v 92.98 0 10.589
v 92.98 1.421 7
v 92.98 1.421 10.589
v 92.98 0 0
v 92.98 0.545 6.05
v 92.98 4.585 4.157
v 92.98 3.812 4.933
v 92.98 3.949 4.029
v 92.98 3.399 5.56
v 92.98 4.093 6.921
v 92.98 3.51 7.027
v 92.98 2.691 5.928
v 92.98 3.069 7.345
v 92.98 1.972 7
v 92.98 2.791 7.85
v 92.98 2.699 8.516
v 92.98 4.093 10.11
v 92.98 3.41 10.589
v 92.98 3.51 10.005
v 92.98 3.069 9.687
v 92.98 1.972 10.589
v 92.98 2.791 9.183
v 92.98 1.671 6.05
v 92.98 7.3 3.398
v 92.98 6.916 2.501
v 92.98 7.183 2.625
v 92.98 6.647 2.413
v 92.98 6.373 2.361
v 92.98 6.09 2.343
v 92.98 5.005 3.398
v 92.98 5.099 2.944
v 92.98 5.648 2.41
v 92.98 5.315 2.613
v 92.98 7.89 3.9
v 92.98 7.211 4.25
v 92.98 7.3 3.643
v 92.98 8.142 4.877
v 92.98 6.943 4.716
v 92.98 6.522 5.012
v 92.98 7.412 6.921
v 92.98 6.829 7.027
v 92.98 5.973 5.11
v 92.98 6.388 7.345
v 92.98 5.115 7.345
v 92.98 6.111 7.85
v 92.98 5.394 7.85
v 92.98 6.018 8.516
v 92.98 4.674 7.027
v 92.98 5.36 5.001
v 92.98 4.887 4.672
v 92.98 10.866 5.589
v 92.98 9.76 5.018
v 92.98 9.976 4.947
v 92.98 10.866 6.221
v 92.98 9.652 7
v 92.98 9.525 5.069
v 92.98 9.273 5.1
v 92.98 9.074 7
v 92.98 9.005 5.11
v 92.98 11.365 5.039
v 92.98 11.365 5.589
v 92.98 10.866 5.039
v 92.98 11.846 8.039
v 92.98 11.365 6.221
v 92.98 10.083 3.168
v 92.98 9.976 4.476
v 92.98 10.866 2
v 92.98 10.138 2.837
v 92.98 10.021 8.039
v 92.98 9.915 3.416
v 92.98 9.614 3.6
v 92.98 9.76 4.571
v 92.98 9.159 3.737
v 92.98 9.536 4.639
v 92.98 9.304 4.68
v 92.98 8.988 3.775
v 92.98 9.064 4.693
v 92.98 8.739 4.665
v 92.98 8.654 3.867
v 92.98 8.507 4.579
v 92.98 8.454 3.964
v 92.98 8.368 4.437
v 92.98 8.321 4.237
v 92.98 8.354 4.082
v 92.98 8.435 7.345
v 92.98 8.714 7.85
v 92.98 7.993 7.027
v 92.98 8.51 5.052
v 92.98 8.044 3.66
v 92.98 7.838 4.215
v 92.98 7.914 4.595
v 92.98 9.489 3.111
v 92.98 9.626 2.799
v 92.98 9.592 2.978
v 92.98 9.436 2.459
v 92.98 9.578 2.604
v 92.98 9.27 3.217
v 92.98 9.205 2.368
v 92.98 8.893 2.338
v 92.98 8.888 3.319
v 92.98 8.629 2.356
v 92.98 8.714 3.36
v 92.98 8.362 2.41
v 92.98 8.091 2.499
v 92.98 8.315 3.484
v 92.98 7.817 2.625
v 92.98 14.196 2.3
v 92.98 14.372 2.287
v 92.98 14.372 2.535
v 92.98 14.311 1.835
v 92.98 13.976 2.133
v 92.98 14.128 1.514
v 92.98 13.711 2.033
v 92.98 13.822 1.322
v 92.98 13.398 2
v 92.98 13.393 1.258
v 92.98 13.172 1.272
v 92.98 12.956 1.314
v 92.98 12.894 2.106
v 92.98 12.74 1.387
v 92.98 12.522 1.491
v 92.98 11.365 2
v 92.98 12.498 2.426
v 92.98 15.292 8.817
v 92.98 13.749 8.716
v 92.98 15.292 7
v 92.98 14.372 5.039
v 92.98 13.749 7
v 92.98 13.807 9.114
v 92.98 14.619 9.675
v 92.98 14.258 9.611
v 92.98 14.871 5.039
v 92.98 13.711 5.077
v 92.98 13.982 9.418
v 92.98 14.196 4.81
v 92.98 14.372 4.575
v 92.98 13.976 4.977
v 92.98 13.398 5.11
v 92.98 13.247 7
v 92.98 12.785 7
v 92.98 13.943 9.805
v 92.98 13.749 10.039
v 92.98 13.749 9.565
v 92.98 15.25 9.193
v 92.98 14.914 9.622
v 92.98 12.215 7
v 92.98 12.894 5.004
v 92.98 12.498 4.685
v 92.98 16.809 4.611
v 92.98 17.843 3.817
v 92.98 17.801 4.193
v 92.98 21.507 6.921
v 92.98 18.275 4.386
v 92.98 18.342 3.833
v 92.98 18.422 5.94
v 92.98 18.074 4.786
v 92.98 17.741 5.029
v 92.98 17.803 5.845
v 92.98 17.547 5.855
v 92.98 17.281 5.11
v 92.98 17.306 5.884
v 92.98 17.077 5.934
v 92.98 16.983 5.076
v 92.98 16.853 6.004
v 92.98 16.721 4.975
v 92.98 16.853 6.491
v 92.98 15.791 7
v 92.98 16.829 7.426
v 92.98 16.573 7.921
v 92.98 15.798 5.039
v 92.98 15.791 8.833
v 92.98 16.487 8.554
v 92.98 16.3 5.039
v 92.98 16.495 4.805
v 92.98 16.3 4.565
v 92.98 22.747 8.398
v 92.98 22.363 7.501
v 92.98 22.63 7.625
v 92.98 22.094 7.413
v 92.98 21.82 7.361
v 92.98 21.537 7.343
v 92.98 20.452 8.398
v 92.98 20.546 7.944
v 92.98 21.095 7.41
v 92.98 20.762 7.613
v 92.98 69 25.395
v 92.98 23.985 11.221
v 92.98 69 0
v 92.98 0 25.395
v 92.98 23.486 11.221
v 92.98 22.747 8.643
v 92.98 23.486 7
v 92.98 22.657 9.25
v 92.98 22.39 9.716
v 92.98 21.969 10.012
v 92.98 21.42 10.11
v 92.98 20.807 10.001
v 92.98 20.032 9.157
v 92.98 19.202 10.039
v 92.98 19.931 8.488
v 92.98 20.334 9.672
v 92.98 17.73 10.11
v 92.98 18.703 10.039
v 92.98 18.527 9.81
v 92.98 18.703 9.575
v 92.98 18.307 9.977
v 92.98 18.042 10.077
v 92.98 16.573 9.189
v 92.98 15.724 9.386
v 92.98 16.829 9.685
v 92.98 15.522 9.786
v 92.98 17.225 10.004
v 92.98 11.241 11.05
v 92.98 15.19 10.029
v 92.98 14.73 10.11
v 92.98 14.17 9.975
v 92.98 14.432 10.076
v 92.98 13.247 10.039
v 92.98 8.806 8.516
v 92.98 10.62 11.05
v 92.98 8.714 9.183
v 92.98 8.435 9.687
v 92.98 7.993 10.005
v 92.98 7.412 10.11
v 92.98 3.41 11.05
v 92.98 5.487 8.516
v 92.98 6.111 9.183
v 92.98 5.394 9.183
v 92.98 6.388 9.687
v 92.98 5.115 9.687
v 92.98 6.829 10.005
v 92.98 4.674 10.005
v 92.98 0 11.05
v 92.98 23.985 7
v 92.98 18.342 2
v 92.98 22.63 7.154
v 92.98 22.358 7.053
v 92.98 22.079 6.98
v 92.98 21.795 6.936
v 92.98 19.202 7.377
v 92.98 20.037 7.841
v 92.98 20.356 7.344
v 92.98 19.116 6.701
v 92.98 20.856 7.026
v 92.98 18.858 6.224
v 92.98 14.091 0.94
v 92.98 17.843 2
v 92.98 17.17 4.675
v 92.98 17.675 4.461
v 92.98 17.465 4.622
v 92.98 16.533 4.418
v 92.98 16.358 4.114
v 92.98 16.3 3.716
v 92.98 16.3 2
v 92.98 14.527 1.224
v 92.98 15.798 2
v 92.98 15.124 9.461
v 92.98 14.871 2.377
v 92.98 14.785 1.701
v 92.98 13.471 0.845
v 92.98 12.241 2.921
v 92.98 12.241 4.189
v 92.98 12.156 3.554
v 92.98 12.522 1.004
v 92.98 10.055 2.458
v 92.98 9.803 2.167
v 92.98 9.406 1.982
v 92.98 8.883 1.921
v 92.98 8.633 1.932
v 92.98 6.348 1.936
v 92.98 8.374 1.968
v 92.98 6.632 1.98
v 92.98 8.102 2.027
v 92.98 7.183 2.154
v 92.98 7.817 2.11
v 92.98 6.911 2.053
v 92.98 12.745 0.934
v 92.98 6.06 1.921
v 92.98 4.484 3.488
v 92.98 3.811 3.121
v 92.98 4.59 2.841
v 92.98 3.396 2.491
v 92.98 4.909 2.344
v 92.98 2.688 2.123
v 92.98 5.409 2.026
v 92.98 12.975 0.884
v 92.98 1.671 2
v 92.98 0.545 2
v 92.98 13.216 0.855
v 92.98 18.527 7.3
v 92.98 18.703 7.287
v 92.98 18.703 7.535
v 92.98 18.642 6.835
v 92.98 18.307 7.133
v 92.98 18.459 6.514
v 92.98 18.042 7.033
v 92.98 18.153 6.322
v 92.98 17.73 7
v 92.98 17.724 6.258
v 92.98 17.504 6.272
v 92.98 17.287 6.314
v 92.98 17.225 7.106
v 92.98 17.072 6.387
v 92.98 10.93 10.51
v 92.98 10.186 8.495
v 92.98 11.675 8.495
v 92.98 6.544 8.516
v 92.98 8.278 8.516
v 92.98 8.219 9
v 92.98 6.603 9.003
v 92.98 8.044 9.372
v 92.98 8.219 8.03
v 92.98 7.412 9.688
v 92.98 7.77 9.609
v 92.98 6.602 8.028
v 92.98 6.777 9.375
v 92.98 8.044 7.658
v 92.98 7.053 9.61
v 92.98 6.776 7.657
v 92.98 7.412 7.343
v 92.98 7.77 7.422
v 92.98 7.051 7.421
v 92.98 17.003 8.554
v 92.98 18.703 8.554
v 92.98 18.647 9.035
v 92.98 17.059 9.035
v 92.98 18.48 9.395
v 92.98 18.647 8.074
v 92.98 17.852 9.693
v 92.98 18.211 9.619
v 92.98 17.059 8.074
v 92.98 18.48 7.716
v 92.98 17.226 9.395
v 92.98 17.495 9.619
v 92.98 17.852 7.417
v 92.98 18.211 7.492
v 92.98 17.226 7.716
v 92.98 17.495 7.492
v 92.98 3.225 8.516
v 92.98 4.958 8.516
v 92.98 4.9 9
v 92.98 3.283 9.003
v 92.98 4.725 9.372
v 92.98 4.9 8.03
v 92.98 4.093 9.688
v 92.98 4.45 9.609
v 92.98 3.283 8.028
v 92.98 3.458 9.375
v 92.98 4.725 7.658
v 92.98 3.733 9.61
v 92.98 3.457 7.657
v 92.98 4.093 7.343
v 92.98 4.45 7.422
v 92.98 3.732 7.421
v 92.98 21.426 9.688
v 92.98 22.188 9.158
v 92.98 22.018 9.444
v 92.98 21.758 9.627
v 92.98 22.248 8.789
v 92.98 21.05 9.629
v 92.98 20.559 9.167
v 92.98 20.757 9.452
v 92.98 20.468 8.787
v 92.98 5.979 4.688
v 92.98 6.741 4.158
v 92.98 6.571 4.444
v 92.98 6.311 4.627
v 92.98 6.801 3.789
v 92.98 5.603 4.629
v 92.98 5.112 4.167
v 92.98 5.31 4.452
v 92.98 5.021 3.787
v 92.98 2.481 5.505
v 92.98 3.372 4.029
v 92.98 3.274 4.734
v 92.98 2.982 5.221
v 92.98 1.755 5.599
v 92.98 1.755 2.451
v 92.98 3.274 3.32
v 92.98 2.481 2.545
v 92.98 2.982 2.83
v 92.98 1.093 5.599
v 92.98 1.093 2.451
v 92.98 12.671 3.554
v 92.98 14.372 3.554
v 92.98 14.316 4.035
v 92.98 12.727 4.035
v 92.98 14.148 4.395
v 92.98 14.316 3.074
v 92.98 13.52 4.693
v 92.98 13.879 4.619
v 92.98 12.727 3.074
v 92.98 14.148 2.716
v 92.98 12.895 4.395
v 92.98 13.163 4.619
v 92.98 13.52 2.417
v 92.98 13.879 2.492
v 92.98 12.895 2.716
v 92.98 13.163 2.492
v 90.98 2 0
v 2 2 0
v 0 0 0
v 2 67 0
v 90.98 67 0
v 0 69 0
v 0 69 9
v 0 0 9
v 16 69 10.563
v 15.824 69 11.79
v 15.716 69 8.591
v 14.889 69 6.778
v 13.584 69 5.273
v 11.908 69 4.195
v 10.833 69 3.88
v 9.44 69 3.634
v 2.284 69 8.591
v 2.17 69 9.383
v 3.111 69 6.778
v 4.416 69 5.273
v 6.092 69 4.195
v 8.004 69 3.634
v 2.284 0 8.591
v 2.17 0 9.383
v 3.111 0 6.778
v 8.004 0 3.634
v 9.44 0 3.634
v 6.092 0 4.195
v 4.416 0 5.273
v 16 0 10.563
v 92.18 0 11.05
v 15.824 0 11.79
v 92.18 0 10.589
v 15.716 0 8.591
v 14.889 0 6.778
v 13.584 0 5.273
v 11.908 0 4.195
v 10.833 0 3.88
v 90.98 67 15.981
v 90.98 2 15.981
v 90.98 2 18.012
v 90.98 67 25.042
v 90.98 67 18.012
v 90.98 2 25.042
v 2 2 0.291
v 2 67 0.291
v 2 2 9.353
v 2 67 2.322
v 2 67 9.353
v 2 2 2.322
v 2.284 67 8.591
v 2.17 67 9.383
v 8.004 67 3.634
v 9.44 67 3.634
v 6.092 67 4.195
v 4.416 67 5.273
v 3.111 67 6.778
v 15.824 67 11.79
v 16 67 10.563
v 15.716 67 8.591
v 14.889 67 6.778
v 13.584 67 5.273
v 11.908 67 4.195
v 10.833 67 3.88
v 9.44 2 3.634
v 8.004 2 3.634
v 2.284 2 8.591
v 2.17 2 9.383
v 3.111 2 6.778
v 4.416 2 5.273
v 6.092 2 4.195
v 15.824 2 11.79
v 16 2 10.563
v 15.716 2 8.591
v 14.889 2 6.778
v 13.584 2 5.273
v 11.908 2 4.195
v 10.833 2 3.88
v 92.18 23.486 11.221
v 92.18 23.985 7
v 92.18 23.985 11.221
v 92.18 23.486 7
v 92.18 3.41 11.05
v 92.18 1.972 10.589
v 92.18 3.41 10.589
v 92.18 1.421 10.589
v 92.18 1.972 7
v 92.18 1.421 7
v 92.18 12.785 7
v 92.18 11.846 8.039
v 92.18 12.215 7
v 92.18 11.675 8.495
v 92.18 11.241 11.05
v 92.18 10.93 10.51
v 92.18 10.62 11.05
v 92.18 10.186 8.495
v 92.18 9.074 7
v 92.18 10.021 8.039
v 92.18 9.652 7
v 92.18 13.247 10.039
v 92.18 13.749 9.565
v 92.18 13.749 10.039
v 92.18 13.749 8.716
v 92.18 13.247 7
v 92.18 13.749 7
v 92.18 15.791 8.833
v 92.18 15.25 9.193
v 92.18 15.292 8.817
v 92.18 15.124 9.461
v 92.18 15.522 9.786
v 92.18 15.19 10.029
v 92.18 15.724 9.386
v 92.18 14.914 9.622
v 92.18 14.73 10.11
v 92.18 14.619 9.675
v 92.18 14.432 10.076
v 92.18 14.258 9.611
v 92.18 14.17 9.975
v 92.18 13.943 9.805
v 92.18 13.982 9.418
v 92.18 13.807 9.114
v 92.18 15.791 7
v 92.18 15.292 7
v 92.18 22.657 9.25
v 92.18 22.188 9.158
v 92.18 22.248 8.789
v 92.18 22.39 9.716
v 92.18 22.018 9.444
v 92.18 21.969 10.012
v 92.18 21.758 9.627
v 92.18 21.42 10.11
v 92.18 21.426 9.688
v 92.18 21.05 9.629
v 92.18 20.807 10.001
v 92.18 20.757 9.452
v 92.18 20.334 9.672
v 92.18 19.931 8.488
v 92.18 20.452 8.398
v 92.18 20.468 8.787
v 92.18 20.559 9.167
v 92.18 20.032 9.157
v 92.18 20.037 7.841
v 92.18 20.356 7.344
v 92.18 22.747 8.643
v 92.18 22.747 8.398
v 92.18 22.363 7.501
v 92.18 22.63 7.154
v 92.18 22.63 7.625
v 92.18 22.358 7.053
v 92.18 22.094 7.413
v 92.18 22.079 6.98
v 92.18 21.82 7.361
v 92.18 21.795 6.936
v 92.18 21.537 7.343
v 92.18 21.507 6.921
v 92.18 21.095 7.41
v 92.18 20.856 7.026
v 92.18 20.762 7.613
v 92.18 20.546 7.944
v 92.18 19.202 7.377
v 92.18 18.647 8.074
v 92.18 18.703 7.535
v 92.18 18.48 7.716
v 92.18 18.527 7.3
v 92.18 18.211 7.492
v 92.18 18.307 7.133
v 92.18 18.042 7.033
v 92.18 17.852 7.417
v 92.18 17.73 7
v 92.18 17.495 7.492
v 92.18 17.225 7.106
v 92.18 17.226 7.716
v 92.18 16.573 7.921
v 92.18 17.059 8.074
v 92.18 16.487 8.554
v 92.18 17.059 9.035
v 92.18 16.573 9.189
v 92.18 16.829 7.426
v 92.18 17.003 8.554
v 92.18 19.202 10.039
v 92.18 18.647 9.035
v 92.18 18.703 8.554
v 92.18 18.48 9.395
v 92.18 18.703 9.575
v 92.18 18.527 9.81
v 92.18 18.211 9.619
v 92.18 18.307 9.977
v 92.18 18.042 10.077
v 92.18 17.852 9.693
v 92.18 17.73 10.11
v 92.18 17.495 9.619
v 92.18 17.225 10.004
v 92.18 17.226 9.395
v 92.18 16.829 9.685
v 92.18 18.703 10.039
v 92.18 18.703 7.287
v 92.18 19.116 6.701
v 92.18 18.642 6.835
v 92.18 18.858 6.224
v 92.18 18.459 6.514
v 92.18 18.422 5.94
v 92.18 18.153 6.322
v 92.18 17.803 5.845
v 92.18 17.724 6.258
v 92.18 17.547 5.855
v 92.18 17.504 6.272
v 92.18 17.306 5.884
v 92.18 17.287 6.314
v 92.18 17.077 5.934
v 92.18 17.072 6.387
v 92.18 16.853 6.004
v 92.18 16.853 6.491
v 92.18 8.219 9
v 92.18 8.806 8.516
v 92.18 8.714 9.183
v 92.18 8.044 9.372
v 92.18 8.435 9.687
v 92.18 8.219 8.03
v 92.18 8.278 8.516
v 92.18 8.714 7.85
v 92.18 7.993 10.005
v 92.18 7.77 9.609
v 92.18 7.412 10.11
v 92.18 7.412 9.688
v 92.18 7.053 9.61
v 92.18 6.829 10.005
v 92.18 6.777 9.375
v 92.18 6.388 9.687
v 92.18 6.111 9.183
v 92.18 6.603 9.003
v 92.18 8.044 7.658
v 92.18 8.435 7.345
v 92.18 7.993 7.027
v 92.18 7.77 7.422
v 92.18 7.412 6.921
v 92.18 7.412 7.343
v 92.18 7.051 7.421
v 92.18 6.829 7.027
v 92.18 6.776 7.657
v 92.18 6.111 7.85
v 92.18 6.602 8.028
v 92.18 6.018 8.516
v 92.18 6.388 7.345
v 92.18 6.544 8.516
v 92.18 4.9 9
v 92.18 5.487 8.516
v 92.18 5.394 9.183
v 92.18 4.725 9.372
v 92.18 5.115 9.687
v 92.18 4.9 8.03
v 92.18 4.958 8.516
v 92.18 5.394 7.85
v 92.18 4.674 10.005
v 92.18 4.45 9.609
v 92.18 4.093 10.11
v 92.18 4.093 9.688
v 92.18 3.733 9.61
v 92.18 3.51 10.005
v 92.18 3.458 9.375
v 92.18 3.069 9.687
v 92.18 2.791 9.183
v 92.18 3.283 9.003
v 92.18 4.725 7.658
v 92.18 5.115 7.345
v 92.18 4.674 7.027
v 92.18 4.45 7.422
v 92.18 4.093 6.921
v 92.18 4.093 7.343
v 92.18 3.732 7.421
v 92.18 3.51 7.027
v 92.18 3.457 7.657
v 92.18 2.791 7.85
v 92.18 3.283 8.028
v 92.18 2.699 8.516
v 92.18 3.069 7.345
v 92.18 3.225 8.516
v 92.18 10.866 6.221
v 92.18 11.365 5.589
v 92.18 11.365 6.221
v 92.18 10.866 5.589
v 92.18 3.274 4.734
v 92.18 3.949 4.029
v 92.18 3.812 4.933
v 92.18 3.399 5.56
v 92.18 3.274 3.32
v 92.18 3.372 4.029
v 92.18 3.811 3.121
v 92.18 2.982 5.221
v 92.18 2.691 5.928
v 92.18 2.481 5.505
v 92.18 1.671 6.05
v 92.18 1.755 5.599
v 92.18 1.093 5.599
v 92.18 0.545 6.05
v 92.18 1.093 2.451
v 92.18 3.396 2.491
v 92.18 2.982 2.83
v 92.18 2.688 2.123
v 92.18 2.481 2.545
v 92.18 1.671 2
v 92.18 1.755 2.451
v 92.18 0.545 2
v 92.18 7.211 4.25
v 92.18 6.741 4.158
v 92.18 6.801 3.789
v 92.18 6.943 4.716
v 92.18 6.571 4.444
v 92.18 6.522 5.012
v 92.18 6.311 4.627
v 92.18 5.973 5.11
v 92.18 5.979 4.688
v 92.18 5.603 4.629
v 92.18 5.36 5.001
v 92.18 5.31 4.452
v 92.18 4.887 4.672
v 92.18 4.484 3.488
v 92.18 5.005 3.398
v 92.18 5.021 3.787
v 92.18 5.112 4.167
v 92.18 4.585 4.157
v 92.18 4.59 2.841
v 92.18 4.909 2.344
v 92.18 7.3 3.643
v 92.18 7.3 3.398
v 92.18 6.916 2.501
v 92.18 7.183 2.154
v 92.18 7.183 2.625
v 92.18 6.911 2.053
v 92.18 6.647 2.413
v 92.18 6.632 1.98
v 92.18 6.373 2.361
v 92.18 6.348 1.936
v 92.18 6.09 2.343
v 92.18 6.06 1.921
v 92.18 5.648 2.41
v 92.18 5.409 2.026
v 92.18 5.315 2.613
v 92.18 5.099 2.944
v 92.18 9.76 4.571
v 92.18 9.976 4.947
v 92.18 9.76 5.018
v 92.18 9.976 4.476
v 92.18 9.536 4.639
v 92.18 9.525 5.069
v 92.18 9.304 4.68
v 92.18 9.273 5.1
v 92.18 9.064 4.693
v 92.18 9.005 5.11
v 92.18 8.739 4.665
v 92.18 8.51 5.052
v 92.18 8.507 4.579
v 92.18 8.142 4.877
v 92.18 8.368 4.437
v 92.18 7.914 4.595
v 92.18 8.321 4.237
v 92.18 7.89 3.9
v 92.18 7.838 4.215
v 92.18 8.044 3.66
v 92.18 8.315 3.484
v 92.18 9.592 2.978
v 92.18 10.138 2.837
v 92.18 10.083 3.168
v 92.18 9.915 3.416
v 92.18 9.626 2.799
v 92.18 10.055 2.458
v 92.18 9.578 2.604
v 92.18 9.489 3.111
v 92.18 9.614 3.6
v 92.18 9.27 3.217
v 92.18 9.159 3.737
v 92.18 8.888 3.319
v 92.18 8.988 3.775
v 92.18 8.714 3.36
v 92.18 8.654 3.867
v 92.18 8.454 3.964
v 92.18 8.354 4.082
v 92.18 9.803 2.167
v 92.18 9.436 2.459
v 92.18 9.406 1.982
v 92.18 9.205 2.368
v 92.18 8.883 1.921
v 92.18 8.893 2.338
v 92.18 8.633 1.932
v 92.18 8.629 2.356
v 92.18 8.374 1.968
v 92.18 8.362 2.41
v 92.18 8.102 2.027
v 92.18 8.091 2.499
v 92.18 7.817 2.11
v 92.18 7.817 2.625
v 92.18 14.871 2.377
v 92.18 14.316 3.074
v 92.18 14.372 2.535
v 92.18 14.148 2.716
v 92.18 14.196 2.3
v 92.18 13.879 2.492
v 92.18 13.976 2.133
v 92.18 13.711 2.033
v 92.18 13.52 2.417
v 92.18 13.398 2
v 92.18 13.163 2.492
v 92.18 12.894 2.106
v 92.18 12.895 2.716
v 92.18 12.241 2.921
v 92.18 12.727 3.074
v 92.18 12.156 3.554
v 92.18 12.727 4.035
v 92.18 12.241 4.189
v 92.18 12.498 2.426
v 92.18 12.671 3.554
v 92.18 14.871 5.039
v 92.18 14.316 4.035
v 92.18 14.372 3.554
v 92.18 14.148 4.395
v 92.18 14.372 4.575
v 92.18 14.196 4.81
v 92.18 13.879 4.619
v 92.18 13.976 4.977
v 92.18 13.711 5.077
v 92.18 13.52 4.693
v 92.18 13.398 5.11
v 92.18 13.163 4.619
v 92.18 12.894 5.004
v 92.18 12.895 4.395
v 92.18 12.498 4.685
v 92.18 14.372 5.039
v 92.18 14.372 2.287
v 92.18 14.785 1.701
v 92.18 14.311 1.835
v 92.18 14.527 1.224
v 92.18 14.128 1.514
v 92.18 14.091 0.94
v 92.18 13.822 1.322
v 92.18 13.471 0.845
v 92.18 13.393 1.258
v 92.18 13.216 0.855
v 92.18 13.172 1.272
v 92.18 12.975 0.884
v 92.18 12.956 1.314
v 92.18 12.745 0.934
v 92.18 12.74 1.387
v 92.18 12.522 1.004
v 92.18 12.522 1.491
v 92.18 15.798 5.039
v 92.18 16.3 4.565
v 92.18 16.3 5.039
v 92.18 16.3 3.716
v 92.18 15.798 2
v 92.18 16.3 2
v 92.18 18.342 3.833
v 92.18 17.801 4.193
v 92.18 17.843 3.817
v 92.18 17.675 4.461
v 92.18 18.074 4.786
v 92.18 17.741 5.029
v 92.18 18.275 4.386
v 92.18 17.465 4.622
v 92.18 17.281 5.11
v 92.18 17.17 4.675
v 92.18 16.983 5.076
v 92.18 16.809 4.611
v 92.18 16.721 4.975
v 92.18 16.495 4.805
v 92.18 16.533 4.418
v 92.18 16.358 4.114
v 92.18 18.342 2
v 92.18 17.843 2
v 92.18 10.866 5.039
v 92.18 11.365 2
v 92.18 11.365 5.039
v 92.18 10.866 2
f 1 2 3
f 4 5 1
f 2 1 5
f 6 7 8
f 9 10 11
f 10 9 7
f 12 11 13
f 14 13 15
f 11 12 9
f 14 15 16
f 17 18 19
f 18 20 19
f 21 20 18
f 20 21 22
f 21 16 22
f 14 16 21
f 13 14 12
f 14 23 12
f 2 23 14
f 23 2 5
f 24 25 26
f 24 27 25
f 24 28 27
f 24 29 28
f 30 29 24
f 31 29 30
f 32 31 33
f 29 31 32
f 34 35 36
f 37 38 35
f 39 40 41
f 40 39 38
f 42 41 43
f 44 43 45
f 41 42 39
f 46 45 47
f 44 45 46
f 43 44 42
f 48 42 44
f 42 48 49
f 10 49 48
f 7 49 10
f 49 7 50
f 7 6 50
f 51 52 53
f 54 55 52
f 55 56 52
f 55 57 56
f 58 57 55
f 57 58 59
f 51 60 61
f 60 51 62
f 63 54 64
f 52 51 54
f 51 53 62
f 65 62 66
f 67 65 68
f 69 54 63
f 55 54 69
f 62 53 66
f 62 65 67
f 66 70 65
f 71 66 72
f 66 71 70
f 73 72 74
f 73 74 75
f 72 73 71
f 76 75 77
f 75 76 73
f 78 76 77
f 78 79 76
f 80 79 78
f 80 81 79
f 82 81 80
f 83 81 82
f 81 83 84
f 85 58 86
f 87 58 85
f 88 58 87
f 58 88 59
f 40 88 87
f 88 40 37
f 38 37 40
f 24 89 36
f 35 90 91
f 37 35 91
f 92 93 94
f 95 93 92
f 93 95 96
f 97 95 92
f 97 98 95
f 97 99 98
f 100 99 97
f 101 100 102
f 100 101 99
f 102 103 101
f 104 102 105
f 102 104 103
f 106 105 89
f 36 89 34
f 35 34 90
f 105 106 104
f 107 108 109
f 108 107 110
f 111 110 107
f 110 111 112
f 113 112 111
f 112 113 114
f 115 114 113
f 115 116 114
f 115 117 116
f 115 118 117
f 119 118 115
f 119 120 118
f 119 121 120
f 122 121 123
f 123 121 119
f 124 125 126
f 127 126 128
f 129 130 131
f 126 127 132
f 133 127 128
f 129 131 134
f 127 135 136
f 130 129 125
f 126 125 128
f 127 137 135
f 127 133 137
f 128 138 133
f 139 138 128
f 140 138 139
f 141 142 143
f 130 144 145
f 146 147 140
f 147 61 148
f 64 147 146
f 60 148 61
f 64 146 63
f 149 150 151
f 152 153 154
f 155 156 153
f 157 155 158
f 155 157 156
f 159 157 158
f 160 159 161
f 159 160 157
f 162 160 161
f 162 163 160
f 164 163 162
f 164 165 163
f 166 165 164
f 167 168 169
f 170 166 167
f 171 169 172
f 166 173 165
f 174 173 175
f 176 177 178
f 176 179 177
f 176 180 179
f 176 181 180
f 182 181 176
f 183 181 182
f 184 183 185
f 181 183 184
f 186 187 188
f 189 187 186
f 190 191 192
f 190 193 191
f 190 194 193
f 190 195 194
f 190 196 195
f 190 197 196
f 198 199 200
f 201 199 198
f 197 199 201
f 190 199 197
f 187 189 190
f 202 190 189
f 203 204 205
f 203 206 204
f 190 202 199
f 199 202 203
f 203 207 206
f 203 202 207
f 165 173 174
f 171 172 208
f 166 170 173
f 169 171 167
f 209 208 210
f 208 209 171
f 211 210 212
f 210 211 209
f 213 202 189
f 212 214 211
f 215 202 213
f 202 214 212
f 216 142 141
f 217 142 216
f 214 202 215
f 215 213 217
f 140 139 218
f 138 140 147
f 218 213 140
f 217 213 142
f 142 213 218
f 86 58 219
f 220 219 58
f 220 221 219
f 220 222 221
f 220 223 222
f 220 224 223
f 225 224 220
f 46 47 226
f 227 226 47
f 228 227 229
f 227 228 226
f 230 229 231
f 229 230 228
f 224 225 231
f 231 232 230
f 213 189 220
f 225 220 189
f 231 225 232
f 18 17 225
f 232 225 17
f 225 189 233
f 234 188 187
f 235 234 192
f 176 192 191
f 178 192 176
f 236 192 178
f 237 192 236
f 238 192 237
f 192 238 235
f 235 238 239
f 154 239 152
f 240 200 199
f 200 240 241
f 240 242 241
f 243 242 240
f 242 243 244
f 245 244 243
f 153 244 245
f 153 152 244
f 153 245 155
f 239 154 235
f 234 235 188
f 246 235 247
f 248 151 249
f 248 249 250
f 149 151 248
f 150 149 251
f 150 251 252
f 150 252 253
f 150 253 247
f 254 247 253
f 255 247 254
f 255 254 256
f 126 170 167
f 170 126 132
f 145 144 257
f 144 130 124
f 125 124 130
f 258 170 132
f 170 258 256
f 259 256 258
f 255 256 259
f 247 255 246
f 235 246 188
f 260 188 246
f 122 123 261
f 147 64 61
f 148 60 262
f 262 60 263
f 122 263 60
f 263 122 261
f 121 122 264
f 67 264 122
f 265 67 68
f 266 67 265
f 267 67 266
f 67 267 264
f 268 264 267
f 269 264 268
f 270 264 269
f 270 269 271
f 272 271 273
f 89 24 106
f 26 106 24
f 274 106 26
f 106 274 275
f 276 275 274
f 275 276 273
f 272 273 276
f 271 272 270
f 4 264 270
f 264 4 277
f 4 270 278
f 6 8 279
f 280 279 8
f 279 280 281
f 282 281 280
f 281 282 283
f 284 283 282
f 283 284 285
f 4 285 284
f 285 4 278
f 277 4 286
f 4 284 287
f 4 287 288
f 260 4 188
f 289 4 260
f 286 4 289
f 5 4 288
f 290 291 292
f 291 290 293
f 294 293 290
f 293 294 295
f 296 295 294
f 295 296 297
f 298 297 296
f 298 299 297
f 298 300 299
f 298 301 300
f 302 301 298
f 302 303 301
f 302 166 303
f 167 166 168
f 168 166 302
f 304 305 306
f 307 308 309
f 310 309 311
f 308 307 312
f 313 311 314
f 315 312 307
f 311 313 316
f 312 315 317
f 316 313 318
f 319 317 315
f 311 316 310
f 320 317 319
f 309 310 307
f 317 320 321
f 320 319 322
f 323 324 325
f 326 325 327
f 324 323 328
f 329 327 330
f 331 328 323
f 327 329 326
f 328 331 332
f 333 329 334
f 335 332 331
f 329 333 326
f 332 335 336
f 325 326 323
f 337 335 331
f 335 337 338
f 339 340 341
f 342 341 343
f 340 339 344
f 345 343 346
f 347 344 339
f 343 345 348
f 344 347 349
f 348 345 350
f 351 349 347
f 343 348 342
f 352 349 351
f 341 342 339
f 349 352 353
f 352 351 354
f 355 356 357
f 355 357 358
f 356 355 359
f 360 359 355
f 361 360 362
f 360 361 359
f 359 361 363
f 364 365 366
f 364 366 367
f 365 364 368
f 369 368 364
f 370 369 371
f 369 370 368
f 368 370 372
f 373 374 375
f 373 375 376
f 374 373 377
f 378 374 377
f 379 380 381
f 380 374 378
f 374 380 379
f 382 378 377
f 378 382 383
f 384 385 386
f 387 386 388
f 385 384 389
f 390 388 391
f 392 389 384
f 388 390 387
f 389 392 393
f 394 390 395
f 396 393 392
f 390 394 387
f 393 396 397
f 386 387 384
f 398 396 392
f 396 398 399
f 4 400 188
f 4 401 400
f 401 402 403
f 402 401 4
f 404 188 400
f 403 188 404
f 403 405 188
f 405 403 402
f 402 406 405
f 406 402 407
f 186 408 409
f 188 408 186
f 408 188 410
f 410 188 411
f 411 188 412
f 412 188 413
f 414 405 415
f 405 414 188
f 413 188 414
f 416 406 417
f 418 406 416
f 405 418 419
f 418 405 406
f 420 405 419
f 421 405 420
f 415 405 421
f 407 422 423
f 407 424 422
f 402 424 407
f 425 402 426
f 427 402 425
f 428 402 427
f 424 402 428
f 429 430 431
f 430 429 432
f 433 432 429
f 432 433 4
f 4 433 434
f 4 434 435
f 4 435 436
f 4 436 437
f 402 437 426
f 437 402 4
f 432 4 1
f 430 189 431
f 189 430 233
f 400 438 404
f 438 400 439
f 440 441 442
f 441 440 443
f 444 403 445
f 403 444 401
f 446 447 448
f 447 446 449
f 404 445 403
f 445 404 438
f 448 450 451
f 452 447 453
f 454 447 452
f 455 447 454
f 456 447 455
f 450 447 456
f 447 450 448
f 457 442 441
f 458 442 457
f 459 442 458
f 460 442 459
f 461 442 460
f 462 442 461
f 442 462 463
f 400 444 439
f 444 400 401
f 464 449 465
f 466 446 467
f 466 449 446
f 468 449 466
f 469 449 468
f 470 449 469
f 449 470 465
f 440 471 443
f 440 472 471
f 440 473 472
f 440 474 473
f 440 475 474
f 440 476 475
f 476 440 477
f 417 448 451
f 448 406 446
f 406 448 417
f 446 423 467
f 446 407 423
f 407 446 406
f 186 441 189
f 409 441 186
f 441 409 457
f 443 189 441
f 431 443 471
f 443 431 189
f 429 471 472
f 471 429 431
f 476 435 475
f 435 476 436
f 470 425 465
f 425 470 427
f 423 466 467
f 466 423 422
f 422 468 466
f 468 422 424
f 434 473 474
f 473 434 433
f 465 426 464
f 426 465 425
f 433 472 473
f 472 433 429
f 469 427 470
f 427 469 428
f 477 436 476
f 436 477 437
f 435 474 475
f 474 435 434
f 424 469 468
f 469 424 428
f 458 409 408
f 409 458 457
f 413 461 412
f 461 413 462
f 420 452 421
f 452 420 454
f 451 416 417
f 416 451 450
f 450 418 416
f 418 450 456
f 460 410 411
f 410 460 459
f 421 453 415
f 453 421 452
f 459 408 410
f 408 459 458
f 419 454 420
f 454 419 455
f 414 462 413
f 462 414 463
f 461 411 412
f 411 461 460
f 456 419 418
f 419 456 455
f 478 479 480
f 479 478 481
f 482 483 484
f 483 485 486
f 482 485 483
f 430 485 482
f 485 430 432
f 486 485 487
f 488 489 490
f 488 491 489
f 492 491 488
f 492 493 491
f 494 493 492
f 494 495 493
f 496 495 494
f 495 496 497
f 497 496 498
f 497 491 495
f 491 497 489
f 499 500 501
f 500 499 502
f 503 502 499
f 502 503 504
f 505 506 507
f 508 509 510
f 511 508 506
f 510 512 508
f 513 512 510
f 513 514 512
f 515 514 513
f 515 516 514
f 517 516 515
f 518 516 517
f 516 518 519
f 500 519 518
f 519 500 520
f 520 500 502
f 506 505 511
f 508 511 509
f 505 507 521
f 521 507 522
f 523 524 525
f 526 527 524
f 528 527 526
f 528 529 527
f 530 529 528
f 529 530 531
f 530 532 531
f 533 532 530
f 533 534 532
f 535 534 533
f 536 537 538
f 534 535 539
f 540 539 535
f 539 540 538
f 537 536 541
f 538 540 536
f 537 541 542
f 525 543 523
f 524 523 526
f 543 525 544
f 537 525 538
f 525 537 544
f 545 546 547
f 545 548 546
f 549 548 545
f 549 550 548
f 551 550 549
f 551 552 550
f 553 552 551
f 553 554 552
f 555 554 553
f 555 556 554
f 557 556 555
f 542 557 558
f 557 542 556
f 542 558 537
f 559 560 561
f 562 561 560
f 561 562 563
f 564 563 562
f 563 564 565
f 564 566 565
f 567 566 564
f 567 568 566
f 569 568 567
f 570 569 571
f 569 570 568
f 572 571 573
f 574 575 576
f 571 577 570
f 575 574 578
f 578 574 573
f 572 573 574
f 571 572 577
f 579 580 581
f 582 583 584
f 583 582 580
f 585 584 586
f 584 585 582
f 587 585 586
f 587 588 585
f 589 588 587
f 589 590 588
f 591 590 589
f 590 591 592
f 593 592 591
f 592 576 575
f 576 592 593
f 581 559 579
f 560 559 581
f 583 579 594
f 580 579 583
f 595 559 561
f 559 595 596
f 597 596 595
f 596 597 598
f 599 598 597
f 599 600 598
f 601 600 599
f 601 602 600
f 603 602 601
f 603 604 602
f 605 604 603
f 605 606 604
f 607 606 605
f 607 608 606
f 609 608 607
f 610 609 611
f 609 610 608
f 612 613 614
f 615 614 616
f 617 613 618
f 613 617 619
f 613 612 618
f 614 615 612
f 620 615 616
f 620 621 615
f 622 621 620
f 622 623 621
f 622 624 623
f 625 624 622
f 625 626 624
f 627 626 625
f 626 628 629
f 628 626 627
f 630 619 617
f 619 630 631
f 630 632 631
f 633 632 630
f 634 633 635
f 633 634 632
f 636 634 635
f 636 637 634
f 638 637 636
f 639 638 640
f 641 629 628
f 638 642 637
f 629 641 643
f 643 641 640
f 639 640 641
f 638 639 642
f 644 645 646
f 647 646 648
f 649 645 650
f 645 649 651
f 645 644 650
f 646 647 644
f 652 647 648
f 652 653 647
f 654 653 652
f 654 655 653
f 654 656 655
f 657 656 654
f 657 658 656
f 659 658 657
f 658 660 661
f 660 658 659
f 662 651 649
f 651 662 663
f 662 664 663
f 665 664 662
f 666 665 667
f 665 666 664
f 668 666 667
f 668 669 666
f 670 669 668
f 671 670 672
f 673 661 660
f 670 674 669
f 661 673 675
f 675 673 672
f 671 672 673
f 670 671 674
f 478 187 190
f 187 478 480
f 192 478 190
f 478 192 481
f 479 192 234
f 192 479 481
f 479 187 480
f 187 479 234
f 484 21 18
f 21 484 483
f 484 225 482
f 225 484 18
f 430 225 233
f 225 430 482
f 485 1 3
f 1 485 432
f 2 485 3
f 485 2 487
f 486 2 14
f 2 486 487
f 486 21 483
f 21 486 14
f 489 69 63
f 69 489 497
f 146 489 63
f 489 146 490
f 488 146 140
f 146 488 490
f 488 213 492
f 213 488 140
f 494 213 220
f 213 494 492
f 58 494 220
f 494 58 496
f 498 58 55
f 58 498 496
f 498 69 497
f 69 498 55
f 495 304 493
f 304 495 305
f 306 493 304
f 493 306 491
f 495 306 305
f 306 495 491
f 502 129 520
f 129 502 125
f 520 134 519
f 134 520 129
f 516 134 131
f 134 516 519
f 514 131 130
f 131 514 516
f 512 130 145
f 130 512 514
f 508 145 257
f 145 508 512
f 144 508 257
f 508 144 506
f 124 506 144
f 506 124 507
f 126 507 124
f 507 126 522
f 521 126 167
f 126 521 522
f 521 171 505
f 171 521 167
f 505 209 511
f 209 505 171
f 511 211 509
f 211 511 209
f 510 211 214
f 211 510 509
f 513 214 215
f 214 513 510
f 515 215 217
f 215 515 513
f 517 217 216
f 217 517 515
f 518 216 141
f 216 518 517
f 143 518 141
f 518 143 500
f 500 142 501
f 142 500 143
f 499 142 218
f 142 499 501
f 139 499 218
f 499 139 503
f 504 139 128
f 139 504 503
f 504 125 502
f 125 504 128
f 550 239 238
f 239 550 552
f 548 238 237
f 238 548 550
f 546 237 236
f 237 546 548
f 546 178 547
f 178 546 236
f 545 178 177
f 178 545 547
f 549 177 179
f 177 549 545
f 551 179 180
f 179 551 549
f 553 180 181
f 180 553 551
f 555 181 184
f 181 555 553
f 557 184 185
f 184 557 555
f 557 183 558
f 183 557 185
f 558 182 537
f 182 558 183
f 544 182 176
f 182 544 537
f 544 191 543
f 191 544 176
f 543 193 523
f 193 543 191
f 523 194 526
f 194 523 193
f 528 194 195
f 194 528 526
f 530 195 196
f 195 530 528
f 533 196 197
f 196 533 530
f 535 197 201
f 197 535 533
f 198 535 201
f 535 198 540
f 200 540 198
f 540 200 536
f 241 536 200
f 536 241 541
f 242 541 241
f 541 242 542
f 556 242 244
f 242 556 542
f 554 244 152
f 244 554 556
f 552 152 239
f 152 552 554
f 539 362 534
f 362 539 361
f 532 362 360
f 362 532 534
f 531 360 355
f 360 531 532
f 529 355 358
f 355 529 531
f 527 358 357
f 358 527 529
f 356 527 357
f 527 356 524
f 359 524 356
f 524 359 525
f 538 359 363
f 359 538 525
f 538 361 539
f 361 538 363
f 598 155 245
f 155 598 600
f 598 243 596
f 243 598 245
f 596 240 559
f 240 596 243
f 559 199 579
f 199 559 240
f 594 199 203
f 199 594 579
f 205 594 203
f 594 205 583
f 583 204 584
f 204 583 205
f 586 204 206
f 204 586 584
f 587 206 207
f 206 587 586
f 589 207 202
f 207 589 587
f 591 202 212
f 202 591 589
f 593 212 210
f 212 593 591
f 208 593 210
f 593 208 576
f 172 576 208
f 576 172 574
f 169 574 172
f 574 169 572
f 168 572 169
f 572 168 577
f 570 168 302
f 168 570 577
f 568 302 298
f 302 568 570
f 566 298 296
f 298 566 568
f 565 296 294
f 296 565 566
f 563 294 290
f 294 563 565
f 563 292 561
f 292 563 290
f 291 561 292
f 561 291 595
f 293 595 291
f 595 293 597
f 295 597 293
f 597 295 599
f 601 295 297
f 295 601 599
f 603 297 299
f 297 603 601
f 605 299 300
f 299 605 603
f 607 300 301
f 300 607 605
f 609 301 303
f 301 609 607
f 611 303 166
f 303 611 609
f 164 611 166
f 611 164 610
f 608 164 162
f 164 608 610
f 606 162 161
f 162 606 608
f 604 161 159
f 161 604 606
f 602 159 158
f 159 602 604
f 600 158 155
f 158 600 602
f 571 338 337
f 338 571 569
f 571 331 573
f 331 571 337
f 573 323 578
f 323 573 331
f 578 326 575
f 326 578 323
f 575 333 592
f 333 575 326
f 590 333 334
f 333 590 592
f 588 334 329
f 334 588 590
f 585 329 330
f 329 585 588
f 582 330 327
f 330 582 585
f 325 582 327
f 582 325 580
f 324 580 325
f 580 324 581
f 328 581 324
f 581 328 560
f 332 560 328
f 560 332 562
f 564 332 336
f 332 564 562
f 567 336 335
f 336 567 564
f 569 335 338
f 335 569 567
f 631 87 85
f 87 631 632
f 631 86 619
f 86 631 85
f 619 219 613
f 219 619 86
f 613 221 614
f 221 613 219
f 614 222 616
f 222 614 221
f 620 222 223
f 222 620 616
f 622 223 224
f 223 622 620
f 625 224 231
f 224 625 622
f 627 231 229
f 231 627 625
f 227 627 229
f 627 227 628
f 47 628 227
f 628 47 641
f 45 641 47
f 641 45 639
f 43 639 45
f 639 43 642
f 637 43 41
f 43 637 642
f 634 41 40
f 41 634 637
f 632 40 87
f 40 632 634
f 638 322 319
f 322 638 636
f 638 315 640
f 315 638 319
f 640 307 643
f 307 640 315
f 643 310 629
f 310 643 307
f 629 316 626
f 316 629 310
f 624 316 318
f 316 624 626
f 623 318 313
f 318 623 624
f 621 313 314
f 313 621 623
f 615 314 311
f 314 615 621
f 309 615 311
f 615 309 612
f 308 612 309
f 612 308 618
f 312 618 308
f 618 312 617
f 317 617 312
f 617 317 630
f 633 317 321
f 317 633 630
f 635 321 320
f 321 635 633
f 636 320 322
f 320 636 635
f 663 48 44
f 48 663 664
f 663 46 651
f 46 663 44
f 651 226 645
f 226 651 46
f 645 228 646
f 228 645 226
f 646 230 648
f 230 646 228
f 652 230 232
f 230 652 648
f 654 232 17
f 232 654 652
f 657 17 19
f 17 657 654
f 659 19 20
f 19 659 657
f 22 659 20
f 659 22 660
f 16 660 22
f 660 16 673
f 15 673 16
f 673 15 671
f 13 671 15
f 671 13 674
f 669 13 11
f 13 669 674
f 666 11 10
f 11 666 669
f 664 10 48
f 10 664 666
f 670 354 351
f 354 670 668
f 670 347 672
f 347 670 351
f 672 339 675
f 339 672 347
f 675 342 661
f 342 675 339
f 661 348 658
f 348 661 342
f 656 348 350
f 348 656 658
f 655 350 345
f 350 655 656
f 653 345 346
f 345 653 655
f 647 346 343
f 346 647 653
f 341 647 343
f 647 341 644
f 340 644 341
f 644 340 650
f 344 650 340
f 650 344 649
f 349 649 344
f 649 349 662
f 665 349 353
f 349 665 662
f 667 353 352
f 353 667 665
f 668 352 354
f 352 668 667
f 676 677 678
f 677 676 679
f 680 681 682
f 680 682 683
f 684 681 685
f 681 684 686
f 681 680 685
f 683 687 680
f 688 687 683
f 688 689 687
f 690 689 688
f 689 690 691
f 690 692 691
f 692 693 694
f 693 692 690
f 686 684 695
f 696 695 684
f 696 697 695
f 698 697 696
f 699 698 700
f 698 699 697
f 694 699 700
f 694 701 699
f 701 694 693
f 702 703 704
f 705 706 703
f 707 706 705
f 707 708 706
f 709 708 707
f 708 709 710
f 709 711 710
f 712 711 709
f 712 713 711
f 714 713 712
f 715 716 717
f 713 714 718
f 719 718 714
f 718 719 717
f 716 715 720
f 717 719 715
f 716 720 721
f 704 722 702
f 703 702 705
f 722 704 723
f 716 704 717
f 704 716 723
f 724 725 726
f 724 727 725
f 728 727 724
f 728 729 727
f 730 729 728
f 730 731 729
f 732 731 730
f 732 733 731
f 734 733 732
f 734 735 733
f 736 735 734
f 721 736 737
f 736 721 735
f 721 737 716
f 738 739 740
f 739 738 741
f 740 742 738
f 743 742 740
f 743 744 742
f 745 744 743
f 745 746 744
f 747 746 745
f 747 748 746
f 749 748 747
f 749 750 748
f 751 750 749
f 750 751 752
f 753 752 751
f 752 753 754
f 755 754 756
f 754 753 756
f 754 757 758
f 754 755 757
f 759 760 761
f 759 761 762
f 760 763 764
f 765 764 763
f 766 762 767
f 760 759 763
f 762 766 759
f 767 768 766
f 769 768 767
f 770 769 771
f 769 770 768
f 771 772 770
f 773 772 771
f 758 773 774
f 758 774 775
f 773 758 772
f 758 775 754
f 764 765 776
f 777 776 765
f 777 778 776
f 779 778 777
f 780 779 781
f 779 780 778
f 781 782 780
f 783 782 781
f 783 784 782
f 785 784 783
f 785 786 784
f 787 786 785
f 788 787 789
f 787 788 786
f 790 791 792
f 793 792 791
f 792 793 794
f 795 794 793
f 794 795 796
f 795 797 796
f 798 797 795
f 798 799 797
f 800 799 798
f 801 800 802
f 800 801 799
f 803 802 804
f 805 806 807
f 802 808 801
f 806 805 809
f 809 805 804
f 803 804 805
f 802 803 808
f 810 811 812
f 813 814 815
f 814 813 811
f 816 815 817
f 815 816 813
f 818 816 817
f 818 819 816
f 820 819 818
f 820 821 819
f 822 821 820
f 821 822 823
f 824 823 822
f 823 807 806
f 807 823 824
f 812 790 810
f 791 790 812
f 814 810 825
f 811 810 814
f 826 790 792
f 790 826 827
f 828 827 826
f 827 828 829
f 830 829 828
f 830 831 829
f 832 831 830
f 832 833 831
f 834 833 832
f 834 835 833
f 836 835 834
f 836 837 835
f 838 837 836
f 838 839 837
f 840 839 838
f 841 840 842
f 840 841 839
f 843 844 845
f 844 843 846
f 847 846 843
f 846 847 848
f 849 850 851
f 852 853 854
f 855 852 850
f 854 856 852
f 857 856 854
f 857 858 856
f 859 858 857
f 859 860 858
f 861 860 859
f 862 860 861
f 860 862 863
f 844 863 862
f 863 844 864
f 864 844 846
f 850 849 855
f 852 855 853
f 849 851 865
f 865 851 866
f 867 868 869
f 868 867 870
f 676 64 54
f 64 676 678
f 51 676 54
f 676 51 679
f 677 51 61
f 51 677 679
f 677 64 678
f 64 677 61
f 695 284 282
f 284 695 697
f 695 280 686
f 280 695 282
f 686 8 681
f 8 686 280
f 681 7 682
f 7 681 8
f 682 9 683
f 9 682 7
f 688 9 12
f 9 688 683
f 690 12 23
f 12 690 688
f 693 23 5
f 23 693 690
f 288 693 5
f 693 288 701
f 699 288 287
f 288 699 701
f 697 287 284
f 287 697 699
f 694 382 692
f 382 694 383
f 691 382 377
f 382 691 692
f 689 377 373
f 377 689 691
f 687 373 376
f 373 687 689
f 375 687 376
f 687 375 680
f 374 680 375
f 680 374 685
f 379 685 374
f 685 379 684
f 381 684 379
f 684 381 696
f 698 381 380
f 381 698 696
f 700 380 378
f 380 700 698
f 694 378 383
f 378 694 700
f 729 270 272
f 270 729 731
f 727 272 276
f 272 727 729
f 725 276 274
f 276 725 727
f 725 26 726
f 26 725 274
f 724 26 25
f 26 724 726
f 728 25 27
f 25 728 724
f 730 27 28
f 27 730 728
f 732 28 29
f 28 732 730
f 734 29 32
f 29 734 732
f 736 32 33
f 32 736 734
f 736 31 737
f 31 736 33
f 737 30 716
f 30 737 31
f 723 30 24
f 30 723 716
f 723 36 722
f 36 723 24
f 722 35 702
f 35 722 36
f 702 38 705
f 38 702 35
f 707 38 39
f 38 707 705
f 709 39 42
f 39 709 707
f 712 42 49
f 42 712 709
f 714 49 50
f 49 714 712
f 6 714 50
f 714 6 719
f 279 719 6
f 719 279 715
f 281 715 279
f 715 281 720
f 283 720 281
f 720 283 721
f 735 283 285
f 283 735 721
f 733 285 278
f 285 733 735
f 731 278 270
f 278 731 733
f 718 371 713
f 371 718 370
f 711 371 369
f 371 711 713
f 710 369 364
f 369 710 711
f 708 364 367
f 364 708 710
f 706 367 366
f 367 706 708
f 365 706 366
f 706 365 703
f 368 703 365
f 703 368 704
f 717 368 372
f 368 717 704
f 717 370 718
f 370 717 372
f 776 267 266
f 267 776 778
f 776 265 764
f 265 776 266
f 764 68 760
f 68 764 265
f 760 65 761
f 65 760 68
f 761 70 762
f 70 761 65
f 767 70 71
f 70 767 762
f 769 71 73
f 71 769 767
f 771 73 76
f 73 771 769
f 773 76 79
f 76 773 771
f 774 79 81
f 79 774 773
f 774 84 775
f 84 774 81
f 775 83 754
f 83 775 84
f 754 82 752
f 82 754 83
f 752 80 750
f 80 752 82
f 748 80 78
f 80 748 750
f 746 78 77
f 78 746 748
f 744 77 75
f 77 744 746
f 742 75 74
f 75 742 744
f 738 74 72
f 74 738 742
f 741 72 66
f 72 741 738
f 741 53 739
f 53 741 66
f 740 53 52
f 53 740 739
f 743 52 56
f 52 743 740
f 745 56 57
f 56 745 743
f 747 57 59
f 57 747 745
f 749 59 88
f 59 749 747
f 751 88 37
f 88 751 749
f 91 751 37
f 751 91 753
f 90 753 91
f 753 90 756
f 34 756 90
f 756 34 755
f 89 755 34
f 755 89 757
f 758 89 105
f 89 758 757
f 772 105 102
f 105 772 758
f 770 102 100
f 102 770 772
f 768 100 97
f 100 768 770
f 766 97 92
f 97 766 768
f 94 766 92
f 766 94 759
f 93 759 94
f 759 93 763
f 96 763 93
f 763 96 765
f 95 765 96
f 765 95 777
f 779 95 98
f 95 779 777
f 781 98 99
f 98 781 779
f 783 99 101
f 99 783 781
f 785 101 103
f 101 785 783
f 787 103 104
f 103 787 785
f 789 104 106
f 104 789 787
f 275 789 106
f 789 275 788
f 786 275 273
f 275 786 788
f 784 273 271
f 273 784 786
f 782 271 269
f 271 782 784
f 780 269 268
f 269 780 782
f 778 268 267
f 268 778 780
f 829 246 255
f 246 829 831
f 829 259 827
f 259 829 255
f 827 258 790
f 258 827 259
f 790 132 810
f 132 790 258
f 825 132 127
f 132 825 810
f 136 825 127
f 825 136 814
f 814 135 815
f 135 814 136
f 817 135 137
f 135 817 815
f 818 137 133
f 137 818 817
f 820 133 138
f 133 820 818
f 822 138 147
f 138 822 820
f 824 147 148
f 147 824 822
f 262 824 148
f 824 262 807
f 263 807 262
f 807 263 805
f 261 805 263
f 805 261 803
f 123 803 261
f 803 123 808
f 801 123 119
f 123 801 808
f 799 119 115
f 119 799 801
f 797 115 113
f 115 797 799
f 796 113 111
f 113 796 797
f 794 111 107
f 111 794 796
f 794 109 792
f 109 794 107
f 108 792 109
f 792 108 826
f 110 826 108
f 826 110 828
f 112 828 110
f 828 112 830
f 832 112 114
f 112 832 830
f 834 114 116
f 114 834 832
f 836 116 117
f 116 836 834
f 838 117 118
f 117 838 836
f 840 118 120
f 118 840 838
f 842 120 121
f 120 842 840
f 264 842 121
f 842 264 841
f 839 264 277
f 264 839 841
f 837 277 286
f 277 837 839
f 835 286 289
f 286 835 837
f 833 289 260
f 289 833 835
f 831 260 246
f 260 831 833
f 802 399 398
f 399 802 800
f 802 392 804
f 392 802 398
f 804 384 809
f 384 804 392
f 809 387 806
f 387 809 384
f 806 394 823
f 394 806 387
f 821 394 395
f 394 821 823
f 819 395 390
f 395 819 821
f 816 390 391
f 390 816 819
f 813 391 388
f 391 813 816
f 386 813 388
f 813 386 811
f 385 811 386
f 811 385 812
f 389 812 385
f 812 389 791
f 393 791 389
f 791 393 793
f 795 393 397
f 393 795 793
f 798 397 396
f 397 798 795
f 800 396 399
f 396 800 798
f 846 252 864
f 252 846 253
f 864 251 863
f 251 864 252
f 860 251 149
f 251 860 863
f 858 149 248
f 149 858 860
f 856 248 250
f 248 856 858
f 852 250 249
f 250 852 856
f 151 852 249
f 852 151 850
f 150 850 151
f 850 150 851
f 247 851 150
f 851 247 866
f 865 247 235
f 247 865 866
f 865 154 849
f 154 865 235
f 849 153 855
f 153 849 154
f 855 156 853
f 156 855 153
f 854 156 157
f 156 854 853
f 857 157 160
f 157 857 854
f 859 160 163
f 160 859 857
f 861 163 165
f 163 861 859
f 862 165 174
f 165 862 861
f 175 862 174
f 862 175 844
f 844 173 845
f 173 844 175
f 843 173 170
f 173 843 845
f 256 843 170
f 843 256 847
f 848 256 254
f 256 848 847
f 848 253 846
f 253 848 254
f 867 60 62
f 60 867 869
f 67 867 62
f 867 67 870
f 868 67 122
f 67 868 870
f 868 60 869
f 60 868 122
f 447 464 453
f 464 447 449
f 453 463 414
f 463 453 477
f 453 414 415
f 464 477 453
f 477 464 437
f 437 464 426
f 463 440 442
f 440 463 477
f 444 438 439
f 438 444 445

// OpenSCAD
accus = 5;
gradient = 10;
accu_diameter = 18;
accu_length = 65;
thickness = 2;


length = accus * accu_diameter;

// Height
// sin alpha = opposite / hypothenuse
// height = length * sin gradient
height = length * sin(gradient);
echo("Height: ", height);

// Base offset
// Due to different ankle
// sin alpha = opposite / hypothenuse
// base_offset = thickness * sin gradient
base_offset = thickness * sin(gradient);
echo("Base offset: ", base_offset);

// Case length
// cos alpha = adjacent / hypothenuse
// case_length = length * cos gradient
case_length = length * cos(gradient) + base_offset;
echo("Case length: ", case_length);

// Grip offset
// sin alpha = opposite / hypothenuse
// grip_offset = accu_diameter / 2 * sin gradient
grip_offset = accu_diameter / 2 * sin(gradient);
echo("Grip offset: ", grip_offset);

// Case
difference() {
    cube([case_length + 2 * thickness, accu_length + 2 * thickness, height + accu_diameter]);
    translate([thickness, thickness, 0]) cube([case_length, accu_length, height + accu_diameter]);
    translate([0, 0, accu_diameter / 2]) rotate([0, -gradient, 0]) cube([length + 2 * thickness + 10, accu_length + 2 * thickness, height + 10]);
    translate([accu_diameter / 2, 1.5 * thickness, accu_diameter / 2 + grip_offset]) rotate([90, 0, 0]) cylinder(2 * thickness, r = accu_diameter / 2 - 2);
    translate([accu_diameter / 2, accu_length + 2.5 * thickness, accu_diameter / 2 + grip_offset]) rotate([90, 0, 0]) cylinder(2 * thickness, r = accu_diameter / 2 - 2);
    
    translate([case_length + 1.6 * thickness, 0, 7]) rotate([90, 0, 90]) linear_extrude(thickness / 2) text("TooAngel", size=4, font="Deftone Stylus:style=Regular");
    translate([case_length + 1.6 * thickness, 0, 2]) rotate([90, 0, 90]) linear_extrude(thickness / 2) text("Design", size=4, font="Deftone Stylus:style=Regular");
}


// Base
translate([base_offset, 0, 0]) rotate([0, -gradient, 0]) cube([length + 2 * thickness, accu_length + 2 * thickness, thickness]);
